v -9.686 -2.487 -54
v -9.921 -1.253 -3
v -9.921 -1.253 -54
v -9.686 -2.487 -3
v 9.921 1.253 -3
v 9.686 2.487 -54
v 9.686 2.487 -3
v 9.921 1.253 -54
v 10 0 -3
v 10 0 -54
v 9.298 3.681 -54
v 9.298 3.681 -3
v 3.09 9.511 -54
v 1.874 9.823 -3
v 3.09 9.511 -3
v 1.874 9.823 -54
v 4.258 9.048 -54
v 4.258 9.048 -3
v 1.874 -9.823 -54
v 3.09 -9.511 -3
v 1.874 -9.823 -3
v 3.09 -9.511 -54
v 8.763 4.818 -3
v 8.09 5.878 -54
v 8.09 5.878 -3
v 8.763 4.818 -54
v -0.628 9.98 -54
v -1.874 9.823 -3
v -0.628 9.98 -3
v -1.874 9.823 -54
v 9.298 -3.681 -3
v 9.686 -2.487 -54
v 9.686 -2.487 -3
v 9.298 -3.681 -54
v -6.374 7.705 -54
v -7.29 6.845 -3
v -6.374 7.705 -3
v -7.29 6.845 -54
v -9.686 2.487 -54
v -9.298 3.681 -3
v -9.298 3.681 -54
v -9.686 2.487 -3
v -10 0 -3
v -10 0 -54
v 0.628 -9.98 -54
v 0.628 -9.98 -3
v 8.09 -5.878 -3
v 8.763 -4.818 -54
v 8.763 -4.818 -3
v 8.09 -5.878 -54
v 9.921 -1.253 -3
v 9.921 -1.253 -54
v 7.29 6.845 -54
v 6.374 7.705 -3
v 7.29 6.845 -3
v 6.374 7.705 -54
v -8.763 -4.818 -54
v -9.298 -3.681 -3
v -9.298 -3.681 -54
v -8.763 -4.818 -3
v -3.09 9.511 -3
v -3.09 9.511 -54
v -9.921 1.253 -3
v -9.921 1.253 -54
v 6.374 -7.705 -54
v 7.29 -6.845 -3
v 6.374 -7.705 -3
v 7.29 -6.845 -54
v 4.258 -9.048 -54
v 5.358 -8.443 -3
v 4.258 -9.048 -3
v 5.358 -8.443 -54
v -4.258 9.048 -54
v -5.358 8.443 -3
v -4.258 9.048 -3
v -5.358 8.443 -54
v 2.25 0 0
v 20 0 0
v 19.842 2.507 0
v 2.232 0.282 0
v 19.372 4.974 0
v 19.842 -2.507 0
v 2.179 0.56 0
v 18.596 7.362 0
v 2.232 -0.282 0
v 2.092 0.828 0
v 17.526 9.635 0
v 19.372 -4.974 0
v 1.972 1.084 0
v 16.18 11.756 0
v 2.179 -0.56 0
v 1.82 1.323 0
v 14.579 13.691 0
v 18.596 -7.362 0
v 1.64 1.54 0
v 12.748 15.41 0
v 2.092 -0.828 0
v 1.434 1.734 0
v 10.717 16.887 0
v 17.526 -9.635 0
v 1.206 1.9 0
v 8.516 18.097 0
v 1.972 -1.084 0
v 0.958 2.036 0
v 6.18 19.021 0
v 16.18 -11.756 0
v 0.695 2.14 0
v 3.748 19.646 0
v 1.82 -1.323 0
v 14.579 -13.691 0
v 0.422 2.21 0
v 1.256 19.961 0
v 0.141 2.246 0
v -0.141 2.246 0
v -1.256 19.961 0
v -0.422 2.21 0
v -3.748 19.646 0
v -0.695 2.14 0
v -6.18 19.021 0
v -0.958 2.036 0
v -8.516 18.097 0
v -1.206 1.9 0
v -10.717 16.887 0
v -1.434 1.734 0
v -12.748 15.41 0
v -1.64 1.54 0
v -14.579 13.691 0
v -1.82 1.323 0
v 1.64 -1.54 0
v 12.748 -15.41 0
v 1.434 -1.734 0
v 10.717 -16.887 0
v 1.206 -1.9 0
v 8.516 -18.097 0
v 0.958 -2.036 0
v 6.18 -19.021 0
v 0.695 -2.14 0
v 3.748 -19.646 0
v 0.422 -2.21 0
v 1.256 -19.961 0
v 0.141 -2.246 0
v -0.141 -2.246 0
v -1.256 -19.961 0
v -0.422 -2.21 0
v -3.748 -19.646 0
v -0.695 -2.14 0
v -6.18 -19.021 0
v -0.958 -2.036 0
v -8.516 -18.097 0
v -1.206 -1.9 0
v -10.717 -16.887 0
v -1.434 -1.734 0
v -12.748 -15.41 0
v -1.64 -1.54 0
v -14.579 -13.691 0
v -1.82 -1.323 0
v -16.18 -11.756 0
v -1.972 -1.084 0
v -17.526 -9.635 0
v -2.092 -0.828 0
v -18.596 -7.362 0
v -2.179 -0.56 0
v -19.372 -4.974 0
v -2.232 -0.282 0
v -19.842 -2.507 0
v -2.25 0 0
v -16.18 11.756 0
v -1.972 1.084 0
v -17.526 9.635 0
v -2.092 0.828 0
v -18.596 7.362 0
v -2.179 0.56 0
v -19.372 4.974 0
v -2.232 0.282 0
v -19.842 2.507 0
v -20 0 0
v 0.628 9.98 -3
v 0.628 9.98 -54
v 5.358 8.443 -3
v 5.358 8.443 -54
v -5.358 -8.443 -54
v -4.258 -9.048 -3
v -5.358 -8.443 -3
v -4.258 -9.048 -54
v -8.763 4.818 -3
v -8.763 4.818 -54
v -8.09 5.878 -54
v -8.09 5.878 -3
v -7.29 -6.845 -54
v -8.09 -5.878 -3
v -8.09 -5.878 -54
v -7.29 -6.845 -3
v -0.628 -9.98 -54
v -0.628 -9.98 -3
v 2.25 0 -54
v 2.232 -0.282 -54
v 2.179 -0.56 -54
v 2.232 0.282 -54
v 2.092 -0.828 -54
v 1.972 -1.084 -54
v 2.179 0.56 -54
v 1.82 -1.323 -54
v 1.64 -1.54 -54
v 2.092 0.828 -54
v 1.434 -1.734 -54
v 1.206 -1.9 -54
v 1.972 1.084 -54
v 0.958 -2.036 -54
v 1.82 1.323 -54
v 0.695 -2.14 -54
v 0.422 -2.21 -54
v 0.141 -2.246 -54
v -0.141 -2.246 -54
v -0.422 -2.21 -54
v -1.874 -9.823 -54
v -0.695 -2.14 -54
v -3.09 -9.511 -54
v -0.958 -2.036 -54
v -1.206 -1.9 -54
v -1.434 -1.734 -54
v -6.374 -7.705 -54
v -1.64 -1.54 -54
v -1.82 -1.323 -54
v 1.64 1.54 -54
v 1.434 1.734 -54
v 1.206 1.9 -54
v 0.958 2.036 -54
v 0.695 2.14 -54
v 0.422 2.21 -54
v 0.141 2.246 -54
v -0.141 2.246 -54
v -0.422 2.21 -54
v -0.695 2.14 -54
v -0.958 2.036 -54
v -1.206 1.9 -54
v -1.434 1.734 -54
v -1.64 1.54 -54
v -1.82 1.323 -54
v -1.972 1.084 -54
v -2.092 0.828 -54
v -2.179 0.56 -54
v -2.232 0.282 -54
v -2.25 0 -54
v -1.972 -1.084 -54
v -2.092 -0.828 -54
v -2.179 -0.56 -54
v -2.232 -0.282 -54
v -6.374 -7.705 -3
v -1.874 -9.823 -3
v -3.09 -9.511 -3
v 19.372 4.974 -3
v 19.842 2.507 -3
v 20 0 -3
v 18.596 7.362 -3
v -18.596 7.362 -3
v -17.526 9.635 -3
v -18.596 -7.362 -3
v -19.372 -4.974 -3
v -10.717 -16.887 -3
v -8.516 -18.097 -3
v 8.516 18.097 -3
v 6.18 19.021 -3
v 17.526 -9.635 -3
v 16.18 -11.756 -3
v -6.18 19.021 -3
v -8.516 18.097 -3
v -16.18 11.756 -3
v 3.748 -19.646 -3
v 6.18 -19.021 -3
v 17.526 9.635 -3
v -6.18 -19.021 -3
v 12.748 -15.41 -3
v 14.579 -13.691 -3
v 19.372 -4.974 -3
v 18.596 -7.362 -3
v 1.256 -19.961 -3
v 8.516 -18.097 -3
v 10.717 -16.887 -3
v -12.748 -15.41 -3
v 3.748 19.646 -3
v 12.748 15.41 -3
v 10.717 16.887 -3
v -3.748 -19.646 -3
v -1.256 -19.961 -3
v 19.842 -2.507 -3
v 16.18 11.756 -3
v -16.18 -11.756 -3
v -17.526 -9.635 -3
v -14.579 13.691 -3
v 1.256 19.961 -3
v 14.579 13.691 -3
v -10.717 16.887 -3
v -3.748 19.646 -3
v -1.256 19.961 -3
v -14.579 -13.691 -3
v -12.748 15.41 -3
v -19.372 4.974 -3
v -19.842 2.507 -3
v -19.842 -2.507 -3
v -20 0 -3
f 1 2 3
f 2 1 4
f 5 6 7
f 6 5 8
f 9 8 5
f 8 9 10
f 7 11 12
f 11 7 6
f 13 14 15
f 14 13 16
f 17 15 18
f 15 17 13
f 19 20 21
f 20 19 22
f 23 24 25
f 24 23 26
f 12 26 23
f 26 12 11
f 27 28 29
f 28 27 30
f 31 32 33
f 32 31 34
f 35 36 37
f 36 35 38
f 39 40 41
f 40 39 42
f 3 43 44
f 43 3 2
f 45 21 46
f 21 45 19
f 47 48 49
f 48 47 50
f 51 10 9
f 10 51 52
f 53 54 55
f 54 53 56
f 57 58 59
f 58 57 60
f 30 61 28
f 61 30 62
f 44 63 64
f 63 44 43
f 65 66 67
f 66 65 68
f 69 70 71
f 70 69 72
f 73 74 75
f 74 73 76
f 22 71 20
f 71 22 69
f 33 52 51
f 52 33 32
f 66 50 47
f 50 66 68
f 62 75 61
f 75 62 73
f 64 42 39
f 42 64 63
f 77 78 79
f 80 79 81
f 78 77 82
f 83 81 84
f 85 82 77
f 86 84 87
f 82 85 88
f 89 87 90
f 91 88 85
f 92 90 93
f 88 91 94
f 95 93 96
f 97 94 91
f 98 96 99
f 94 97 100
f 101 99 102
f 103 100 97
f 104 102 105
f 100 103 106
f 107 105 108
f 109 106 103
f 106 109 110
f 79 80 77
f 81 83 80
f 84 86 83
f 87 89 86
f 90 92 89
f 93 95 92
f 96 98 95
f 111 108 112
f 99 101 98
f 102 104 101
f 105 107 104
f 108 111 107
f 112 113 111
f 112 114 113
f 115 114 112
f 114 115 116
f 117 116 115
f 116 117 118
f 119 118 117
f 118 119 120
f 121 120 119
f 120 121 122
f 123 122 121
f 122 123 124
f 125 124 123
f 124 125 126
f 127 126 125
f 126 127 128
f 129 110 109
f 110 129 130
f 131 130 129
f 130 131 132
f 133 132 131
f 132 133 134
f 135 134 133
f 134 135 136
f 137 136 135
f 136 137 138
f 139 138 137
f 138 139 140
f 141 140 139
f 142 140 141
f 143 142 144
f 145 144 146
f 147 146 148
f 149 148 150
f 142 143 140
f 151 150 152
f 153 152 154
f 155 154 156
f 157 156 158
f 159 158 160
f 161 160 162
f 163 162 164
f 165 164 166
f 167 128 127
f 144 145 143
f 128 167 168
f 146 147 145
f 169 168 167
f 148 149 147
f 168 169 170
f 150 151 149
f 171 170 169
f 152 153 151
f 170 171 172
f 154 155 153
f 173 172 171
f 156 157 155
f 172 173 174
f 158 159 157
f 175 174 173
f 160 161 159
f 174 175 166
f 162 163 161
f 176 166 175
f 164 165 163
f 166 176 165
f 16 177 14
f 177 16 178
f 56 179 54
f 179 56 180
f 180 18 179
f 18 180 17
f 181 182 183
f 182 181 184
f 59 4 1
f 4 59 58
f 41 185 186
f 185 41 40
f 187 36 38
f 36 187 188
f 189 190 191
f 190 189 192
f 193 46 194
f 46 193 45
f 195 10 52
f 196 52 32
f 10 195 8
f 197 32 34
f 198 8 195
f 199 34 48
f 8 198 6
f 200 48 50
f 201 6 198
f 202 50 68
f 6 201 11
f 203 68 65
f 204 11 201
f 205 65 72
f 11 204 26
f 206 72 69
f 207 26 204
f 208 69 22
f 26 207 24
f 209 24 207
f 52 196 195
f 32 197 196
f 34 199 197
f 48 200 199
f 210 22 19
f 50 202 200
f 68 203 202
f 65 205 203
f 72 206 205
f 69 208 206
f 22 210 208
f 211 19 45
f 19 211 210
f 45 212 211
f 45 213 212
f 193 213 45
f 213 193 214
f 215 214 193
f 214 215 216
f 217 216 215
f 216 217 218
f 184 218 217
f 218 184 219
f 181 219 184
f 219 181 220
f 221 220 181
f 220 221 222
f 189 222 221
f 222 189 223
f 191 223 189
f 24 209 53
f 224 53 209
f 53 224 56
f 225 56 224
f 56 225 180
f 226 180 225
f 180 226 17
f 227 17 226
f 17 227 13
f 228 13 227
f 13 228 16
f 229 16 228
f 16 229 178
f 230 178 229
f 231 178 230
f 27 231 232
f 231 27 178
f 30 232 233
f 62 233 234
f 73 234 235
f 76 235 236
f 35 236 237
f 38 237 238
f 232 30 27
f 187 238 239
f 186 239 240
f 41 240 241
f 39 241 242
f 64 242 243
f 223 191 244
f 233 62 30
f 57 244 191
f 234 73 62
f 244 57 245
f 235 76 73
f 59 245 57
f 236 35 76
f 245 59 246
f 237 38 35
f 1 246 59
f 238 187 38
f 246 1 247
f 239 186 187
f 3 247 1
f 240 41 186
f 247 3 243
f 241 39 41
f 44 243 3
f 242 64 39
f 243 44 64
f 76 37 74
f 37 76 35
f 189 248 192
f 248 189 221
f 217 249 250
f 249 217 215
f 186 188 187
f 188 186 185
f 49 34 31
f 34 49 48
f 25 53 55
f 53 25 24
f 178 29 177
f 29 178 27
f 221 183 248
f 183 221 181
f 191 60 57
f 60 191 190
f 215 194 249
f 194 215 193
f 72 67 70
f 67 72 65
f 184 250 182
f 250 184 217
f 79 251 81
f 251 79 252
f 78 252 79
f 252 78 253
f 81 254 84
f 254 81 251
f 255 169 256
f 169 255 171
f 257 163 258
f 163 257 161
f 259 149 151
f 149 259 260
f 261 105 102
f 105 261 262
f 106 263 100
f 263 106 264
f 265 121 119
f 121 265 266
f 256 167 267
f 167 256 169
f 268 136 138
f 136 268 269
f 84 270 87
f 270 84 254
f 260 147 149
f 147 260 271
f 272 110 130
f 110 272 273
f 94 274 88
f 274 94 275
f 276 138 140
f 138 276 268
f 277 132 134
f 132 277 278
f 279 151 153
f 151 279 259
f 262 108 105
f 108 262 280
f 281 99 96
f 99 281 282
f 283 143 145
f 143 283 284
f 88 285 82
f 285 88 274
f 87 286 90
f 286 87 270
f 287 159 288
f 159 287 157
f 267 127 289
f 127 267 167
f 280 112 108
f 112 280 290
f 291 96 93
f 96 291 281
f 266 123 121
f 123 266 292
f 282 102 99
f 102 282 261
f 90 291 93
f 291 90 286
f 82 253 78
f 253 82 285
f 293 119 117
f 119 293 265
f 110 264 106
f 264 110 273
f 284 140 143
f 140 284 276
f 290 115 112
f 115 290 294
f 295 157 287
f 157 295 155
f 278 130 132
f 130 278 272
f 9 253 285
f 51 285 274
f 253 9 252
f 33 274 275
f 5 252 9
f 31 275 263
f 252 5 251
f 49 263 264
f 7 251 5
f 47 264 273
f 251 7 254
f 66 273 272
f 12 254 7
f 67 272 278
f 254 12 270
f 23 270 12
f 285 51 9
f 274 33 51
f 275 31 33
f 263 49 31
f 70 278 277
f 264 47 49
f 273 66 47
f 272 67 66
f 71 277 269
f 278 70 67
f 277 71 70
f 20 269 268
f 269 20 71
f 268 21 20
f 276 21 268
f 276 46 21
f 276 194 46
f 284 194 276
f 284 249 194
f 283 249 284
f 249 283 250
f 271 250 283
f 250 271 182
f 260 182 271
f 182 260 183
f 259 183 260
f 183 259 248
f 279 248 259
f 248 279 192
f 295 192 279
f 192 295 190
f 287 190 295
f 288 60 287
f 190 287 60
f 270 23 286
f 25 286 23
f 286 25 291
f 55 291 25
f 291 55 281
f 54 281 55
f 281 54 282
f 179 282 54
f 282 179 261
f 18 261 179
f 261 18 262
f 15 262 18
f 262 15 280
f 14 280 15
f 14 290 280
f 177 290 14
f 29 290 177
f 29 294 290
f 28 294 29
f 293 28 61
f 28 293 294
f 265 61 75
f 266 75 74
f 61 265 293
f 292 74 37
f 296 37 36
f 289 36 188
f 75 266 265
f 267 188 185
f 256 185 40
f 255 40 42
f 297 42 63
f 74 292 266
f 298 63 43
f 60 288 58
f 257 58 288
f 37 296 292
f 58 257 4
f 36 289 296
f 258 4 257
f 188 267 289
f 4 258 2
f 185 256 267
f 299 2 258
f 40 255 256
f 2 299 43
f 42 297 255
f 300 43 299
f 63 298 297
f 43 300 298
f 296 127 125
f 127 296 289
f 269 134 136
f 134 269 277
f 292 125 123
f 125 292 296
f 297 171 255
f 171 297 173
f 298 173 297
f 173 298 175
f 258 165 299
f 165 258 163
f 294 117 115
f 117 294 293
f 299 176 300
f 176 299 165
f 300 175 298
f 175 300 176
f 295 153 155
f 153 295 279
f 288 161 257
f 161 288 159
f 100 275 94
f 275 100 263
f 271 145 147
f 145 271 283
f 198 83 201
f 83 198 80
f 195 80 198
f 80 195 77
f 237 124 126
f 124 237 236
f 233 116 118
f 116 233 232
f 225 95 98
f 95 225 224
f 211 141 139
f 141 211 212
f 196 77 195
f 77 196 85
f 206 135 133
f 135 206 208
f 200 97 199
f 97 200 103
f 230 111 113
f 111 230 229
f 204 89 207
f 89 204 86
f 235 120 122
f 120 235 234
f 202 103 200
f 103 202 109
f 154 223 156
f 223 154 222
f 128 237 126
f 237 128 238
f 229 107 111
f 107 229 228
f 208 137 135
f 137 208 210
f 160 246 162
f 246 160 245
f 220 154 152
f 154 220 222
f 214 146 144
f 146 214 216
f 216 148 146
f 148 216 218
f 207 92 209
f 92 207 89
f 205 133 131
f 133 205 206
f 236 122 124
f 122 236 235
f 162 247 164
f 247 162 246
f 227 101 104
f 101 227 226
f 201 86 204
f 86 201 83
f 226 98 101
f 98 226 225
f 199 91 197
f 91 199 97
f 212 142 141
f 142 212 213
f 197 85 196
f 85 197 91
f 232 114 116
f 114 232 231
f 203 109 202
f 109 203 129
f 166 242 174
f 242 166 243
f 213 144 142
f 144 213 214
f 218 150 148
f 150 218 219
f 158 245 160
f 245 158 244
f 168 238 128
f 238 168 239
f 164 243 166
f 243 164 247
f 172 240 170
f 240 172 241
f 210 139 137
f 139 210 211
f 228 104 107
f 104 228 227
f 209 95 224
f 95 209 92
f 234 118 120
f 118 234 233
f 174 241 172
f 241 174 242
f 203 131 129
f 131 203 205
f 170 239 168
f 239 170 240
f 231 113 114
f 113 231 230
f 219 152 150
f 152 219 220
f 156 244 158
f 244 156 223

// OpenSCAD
$fn = 50;


difference() {
	union() {
		translate(v = [0, 0, -54.0000000000]) {
			cylinder(h = 54, r = 10.0000000000);
		}
		translate(v = [0, 0, -3.0000000000]) {
			cylinder(h = 3, r = 20.0000000000);
		}
	}
	union() {
		#translate(v = [0, 0, -54]) {
			cylinder(h = 54, r = 2.2500000000);
		}
	}
}
